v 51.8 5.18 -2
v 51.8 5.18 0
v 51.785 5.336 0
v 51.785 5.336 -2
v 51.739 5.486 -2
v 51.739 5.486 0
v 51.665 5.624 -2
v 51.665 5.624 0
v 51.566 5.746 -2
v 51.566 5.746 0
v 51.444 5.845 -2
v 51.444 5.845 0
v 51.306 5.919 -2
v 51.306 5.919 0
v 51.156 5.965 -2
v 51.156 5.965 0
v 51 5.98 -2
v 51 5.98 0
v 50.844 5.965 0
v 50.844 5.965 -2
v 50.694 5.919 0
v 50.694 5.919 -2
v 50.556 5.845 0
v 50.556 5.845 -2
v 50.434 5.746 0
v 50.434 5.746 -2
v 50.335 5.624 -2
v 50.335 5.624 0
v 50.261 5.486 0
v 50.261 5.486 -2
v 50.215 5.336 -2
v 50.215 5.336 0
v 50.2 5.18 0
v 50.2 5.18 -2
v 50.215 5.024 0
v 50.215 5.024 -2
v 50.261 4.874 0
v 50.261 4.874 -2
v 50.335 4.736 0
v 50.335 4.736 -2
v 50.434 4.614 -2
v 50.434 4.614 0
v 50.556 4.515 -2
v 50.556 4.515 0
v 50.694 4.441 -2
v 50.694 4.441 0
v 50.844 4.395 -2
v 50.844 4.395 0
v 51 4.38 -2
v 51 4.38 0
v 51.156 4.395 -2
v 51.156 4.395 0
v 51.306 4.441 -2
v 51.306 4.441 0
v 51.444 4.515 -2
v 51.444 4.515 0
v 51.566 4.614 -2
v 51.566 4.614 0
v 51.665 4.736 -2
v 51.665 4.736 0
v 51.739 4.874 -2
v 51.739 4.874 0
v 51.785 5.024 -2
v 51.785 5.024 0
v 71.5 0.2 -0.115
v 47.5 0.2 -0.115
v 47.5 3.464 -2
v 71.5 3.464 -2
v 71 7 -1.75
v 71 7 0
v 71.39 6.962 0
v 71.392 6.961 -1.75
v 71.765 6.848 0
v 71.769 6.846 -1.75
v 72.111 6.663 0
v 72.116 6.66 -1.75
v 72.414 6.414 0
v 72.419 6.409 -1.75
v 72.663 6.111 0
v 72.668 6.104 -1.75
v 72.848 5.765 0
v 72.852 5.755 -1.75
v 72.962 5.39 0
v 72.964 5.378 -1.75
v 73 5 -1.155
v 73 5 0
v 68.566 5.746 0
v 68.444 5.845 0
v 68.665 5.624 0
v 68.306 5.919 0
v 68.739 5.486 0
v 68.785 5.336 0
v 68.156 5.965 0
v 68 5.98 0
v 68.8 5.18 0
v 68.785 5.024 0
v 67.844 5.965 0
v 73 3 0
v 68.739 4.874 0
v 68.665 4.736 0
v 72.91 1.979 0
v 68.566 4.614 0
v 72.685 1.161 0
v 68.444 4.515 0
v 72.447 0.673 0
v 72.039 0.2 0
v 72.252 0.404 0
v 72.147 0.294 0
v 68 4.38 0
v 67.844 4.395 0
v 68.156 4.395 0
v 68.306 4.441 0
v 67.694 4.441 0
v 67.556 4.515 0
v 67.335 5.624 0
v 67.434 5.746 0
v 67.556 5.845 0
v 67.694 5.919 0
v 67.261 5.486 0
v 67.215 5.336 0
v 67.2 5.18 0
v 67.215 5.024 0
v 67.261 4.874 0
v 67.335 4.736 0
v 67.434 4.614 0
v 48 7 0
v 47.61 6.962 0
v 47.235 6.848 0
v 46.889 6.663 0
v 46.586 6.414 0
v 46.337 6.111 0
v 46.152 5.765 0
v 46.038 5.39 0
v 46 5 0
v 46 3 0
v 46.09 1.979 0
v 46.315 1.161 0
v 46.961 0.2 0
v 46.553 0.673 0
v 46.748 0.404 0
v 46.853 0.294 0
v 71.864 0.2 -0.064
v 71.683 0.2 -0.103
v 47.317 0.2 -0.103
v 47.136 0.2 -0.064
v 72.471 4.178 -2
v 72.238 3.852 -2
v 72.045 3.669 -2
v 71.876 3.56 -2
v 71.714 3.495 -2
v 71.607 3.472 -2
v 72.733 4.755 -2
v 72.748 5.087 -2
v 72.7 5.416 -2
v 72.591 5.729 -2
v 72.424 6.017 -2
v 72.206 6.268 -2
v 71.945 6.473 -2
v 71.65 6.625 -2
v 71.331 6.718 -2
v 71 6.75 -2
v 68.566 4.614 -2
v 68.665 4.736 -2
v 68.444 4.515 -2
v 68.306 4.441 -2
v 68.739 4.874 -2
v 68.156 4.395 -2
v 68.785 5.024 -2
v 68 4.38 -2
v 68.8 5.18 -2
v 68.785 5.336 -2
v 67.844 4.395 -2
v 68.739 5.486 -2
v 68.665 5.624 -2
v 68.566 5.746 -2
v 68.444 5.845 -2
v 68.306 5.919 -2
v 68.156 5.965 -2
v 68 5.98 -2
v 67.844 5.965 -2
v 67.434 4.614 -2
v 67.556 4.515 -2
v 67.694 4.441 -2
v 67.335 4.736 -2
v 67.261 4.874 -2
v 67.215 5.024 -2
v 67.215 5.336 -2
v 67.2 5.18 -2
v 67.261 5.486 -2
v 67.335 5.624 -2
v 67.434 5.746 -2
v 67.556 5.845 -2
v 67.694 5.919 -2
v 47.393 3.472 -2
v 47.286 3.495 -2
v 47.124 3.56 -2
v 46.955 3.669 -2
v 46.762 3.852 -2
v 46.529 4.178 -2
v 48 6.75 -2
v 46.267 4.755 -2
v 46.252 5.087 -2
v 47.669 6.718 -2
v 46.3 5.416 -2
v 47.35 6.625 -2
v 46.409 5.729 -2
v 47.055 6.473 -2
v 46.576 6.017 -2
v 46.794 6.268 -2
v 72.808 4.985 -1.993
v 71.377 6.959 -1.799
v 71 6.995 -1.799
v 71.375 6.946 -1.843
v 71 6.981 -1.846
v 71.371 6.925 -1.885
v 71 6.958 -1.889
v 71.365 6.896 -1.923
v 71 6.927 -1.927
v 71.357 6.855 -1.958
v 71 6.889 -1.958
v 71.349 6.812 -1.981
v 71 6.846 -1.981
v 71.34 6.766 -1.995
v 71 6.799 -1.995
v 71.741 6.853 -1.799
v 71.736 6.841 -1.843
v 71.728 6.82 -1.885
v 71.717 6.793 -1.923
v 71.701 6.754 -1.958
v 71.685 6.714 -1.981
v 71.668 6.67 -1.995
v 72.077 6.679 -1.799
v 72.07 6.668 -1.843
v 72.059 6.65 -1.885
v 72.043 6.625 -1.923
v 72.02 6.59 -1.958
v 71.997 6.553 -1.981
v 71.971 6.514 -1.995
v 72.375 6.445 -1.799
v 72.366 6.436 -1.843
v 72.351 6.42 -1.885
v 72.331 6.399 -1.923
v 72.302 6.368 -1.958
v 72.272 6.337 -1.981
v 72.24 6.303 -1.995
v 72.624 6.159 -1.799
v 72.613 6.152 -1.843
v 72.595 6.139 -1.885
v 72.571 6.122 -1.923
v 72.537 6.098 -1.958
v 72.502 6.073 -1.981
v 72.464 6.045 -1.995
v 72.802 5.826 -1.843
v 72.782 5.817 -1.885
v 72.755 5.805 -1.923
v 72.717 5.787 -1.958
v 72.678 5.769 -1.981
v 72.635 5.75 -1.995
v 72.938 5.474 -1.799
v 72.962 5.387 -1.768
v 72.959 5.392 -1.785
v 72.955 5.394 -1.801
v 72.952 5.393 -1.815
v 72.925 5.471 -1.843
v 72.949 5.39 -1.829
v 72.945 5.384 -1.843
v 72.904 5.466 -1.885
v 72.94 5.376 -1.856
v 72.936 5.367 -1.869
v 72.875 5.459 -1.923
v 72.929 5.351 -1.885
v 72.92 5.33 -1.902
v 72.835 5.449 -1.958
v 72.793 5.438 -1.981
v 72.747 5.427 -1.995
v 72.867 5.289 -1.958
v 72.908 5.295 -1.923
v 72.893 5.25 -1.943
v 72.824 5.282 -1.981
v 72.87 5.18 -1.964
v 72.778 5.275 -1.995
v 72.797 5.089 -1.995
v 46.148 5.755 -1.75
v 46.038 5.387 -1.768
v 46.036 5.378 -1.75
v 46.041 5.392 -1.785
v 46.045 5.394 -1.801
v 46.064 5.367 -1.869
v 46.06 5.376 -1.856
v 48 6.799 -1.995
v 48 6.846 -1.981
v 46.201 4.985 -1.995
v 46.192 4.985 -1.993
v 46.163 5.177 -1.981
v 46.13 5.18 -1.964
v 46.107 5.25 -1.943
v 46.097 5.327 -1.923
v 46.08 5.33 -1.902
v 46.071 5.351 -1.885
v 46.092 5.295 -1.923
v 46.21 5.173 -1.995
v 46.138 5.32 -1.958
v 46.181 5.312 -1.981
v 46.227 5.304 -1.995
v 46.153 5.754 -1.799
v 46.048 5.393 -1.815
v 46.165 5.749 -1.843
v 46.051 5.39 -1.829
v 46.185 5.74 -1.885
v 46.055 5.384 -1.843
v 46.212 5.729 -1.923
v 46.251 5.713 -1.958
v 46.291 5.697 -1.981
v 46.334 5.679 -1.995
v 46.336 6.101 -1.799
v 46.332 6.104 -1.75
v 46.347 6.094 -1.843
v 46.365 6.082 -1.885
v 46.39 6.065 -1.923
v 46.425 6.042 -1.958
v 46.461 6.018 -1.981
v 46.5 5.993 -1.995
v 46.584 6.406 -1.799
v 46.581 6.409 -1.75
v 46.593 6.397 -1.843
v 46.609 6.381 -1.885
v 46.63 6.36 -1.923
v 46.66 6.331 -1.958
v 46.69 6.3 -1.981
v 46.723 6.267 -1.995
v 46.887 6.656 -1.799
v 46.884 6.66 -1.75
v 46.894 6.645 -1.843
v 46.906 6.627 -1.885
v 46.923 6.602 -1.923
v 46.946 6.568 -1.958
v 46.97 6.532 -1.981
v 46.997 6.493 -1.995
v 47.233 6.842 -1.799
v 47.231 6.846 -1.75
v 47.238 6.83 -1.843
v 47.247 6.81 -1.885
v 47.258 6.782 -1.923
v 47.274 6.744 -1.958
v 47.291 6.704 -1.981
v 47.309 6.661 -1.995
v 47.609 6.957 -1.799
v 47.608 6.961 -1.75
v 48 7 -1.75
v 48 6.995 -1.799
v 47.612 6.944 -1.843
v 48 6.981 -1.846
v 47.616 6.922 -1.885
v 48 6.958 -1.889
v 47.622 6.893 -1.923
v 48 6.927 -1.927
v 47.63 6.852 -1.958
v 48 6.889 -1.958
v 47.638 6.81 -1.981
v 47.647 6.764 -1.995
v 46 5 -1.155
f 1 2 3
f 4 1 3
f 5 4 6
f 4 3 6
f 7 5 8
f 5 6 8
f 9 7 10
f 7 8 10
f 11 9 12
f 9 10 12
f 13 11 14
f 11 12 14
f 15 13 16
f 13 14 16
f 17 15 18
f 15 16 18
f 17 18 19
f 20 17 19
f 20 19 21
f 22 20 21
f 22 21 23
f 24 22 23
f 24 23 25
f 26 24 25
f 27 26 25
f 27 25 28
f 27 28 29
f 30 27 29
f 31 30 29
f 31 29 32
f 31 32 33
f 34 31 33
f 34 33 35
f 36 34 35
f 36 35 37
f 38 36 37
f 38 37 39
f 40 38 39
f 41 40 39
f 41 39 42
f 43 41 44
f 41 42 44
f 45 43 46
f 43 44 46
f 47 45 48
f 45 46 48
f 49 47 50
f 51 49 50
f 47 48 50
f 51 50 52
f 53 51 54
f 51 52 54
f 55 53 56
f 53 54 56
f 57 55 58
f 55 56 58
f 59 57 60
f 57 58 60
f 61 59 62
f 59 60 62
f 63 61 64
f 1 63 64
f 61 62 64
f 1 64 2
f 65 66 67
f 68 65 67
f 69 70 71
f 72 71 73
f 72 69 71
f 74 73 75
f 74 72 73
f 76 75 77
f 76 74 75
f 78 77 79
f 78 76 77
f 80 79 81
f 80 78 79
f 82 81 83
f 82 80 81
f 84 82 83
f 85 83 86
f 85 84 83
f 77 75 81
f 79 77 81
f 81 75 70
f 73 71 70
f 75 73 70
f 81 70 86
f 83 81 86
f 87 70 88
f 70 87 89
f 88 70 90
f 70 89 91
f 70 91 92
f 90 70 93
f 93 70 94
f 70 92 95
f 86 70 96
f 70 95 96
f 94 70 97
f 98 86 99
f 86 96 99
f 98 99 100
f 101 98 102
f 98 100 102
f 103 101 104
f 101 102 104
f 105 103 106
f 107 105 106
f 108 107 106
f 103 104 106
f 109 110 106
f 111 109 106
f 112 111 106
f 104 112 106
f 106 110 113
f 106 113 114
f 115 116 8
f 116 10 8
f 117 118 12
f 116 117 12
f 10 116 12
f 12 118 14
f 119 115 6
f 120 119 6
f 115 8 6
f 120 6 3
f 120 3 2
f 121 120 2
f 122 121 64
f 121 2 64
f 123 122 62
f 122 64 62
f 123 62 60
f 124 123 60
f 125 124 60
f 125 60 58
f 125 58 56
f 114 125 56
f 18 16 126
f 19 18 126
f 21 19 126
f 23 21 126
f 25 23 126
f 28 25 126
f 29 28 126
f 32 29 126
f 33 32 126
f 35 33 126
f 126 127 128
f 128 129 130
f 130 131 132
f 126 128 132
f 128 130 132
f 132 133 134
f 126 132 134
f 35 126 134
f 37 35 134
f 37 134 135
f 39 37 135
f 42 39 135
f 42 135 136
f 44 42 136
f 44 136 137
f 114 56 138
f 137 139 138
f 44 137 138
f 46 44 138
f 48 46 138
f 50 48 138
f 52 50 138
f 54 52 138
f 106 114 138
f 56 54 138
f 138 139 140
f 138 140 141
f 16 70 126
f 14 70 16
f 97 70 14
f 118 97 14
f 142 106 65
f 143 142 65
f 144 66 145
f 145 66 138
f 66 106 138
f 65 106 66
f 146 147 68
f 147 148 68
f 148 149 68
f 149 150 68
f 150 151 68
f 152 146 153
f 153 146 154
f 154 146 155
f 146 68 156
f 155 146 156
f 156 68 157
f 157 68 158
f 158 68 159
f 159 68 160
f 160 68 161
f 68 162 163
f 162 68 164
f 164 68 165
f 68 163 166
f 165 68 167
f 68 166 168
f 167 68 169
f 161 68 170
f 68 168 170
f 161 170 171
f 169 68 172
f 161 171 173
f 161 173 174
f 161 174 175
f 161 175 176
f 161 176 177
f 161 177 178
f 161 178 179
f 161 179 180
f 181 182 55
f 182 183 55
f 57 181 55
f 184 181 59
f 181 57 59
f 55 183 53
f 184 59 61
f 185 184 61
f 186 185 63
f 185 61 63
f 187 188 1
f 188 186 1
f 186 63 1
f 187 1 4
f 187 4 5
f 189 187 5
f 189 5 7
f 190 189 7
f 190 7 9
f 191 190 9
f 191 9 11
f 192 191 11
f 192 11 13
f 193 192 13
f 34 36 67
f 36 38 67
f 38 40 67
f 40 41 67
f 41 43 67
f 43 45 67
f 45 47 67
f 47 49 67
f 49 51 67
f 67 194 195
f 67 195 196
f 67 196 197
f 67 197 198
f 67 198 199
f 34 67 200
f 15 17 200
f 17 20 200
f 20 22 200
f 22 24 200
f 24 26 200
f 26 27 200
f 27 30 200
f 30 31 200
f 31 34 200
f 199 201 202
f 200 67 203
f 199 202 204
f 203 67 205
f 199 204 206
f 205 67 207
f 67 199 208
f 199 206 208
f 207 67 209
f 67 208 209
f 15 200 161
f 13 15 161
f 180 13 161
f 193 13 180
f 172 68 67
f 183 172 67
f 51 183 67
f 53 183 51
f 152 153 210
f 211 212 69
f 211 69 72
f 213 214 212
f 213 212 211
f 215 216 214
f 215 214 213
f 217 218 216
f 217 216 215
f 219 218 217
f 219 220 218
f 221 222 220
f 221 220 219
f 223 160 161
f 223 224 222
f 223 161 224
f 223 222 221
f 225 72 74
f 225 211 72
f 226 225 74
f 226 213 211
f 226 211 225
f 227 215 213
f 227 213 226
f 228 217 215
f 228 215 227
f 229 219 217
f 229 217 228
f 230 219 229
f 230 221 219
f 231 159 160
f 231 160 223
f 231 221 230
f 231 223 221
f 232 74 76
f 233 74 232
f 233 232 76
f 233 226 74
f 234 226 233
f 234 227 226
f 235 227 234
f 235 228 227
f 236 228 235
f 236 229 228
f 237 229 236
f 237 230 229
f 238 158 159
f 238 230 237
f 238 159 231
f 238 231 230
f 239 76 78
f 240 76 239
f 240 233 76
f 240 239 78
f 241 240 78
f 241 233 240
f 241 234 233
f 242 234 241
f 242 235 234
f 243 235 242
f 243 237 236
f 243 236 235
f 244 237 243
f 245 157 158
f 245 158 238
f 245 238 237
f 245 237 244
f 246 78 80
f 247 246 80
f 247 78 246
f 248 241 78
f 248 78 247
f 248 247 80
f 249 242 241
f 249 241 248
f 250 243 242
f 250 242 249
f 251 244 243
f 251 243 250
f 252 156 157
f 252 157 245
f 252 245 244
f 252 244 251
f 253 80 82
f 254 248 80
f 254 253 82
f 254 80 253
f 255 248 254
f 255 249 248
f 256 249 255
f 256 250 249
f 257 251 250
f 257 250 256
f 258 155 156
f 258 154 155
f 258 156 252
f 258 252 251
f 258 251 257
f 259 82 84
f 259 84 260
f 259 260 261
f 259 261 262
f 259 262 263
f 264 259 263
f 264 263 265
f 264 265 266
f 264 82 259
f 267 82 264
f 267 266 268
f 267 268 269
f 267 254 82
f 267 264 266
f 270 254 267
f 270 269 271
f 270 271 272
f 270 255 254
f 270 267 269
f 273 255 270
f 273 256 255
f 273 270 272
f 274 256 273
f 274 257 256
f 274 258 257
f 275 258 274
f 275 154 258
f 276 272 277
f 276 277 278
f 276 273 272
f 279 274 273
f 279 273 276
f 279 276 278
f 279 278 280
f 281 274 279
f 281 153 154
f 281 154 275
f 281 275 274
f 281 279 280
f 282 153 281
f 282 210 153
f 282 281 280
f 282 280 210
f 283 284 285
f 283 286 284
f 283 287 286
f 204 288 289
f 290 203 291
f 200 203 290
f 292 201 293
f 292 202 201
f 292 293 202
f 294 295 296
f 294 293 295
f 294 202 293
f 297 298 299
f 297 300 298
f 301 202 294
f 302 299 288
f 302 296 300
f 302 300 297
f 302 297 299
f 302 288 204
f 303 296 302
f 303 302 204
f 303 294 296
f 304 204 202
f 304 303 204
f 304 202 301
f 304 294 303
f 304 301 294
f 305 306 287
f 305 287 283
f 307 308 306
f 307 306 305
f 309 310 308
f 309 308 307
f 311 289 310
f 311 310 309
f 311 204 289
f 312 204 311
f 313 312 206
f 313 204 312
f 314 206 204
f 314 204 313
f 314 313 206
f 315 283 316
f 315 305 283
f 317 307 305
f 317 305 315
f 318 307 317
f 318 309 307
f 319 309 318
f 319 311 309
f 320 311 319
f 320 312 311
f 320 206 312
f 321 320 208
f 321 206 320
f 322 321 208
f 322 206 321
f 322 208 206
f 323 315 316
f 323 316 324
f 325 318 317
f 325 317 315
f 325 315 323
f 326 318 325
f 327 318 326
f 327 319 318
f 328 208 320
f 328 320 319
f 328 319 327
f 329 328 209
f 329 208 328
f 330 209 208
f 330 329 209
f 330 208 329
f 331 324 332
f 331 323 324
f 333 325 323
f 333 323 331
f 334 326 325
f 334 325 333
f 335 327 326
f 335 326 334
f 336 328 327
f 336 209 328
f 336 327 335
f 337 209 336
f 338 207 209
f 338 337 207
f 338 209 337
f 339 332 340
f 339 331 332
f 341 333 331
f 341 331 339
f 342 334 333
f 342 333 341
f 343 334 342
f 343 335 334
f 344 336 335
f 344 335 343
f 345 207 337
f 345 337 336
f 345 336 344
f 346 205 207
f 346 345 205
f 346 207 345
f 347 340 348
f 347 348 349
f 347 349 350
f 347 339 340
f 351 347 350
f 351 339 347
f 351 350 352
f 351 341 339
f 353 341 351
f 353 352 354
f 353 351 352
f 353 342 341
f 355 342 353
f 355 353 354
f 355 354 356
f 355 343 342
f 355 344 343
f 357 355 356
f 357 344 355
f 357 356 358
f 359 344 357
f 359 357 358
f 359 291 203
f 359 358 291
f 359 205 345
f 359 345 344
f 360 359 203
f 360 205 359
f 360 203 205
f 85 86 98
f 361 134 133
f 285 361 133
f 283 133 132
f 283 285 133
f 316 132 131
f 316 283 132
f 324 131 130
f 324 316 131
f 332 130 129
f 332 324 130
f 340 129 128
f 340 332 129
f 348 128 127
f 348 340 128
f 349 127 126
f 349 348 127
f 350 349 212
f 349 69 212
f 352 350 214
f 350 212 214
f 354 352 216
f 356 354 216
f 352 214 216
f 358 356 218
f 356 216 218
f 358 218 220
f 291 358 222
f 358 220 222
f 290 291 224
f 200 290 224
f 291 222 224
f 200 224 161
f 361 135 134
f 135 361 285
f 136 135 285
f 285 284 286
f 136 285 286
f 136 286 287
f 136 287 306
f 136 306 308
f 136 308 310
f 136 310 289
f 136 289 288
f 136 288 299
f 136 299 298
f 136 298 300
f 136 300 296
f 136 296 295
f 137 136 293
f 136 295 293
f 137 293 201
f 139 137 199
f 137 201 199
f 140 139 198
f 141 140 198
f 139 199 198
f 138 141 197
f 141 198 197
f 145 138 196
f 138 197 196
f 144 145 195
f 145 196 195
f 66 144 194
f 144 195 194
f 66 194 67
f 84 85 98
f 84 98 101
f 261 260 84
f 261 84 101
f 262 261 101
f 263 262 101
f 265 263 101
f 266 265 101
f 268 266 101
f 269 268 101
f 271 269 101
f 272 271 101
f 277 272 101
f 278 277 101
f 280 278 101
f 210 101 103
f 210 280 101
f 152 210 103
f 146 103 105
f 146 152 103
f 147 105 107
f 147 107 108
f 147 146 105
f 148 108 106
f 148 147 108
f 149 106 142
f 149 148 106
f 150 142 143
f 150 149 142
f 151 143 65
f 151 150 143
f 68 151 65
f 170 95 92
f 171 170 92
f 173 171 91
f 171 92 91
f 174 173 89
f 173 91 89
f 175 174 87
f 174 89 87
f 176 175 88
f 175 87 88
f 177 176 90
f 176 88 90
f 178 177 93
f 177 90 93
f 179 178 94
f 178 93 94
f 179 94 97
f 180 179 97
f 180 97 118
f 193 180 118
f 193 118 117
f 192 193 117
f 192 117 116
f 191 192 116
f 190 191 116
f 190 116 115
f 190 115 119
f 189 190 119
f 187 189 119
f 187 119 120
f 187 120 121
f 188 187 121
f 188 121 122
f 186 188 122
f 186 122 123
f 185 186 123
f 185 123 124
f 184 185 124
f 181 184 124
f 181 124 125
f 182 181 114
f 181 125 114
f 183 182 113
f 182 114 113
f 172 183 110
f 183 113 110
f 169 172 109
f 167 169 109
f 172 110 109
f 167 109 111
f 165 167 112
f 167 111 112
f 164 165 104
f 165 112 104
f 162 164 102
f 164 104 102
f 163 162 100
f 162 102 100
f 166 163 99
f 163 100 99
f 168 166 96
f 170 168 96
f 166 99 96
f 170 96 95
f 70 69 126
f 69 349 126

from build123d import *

# Parameters (mm, degrees)
WEDGE_GENERAL_SHAPE_DEPTH       = 73
SKETCH7_W                       = 10
SKETCH7_H                       = 0.2
KNIFE_EDGE_REMOVER_DEPTH        = 74.362115564
FILLET5_R                       = 1.5
FILLET2_START                   = -3
FILLET2_DEPTH                   = 4
BABY_WEDGE_SHORTENER_DEPTH      = 74.362115676
BABY_WEDGE_SHORTENER_DEPTH_BACK = 74.362115676
SKETCH11_W                      = 46
SKETCH11_H                      = 7
FILLET1_R                       = 1.5
FILLET3_START                   = -3
FILLET3_DEPTH                   = 4
BABY_WEDGE_M2_HOLES_D           = 1.6
BITEFILLET_R                    = 0.25


with BuildPart() as part:
    # Sketch2 → Wedge General Shape (new body)
    with BuildSketch(Plane(origin=(0, 0, 0), x_dir=(0, 0, -1), z_dir=(1, 0, 0))):
        Polygon((0, 7), (0, 0), (2, 3.464101615), (2, 7), align=None)
    extrude(amount=WEDGE_GENERAL_SHAPE_DEPTH)

    # Sketch7 → Knife Edge Remover (cut, through all)
    with BuildSketch(Plane(origin=(0, 0, 0), x_dir=(0, 0, -1), z_dir=(1, 0, 0))):
        with Locations((0, 0.1)):
            Rectangle(SKETCH7_W, SKETCH7_H)
    extrude(amount=KNIFE_EDGE_REMOVER_DEPTH, mode=Mode.SUBTRACT)

    # Fillet5
    fillet5_edges = [part.edges().sort_by_distance(p)[0] for p in [
        (73, 1.832050808, -1.057735027),
    ]]
    fillet(fillet5_edges, radius=FILLET5_R)

    # Fillet2: read off the stored shape, not the designer's step
    # Fillet2 outline → Fillet2 (cut)
    with BuildSketch(Plane.XY.offset(FILLET2_START)):
        with BuildLine():
            Line((73, 7), (71, 7))
            ThreePointArc((71, 7), (72.414213562, 6.414213562), (73, 5))
            Line((73, 5), (73, 7))
        make_face()
        with BuildLine():
            ThreePointArc((0, 5), (0.585786438, 6.414213562), (2, 7))
            Line((2, 7), (0, 7))
            Line((0, 7), (0, 5))
        make_face()
    extrude(amount=FILLET2_DEPTH, mode=Mode.SUBTRACT)

    # Sketch11 → Baby Wedge Shortener (cut, two sides: drawn at the far end of the back side and taken through both)
    with BuildSketch(Plane(origin=(0, 0, -2), x_dir=(-1, 0, 0), z_dir=(0, 0, -1)).offset(-BABY_WEDGE_SHORTENER_DEPTH_BACK)):
        with Locations((-23, 3.5)):
            Rectangle(SKETCH11_W, SKETCH11_H)
    extrude(amount=BABY_WEDGE_SHORTENER_DEPTH + BABY_WEDGE_SHORTENER_DEPTH_BACK, mode=Mode.SUBTRACT)

    # Fillet1
    fillet1_edges = [part.edges().sort_by_distance(p)[0] for p in [
        (46, 1.832050808, -1.057735027),
    ]]
    fillet(fillet1_edges, radius=FILLET1_R)

    # Fillet3: read off the stored shape, not the designer's step
    # Fillet3 outline → Fillet3 (cut)
    with BuildSketch(Plane.XY.offset(FILLET3_START)):
        with BuildLine():
            Line((46, 7), (46, 5))
            ThreePointArc((46, 5), (46.585786438, 6.414213562), (48, 7))
            Line((48, 7), (46, 7))
        make_face()
    extrude(amount=FILLET3_DEPTH, mode=Mode.SUBTRACT)

    # Baby Wedge M2 Holes (through all)
    with Locations(Plane(origin=(0, 0, -2), x_dir=(-1, 0, 0), z_dir=(0, 0, -1))):
        with Locations((-68, 5.18), (-51, 5.18)):
            Hole(BABY_WEDGE_M2_HOLES_D / 2)

    # BiteFillet
    bitefillet_edges = [part.edges().sort_by_distance(p)[0] for p in [
        (72.209561466, 6.592784059, -2),
        (46.790438534, 6.592784059, -2),
        (59.5, 7, -2),
    ]]
    fillet(bitefillet_edges, radius=BITEFILLET_R)


solid = part.part
